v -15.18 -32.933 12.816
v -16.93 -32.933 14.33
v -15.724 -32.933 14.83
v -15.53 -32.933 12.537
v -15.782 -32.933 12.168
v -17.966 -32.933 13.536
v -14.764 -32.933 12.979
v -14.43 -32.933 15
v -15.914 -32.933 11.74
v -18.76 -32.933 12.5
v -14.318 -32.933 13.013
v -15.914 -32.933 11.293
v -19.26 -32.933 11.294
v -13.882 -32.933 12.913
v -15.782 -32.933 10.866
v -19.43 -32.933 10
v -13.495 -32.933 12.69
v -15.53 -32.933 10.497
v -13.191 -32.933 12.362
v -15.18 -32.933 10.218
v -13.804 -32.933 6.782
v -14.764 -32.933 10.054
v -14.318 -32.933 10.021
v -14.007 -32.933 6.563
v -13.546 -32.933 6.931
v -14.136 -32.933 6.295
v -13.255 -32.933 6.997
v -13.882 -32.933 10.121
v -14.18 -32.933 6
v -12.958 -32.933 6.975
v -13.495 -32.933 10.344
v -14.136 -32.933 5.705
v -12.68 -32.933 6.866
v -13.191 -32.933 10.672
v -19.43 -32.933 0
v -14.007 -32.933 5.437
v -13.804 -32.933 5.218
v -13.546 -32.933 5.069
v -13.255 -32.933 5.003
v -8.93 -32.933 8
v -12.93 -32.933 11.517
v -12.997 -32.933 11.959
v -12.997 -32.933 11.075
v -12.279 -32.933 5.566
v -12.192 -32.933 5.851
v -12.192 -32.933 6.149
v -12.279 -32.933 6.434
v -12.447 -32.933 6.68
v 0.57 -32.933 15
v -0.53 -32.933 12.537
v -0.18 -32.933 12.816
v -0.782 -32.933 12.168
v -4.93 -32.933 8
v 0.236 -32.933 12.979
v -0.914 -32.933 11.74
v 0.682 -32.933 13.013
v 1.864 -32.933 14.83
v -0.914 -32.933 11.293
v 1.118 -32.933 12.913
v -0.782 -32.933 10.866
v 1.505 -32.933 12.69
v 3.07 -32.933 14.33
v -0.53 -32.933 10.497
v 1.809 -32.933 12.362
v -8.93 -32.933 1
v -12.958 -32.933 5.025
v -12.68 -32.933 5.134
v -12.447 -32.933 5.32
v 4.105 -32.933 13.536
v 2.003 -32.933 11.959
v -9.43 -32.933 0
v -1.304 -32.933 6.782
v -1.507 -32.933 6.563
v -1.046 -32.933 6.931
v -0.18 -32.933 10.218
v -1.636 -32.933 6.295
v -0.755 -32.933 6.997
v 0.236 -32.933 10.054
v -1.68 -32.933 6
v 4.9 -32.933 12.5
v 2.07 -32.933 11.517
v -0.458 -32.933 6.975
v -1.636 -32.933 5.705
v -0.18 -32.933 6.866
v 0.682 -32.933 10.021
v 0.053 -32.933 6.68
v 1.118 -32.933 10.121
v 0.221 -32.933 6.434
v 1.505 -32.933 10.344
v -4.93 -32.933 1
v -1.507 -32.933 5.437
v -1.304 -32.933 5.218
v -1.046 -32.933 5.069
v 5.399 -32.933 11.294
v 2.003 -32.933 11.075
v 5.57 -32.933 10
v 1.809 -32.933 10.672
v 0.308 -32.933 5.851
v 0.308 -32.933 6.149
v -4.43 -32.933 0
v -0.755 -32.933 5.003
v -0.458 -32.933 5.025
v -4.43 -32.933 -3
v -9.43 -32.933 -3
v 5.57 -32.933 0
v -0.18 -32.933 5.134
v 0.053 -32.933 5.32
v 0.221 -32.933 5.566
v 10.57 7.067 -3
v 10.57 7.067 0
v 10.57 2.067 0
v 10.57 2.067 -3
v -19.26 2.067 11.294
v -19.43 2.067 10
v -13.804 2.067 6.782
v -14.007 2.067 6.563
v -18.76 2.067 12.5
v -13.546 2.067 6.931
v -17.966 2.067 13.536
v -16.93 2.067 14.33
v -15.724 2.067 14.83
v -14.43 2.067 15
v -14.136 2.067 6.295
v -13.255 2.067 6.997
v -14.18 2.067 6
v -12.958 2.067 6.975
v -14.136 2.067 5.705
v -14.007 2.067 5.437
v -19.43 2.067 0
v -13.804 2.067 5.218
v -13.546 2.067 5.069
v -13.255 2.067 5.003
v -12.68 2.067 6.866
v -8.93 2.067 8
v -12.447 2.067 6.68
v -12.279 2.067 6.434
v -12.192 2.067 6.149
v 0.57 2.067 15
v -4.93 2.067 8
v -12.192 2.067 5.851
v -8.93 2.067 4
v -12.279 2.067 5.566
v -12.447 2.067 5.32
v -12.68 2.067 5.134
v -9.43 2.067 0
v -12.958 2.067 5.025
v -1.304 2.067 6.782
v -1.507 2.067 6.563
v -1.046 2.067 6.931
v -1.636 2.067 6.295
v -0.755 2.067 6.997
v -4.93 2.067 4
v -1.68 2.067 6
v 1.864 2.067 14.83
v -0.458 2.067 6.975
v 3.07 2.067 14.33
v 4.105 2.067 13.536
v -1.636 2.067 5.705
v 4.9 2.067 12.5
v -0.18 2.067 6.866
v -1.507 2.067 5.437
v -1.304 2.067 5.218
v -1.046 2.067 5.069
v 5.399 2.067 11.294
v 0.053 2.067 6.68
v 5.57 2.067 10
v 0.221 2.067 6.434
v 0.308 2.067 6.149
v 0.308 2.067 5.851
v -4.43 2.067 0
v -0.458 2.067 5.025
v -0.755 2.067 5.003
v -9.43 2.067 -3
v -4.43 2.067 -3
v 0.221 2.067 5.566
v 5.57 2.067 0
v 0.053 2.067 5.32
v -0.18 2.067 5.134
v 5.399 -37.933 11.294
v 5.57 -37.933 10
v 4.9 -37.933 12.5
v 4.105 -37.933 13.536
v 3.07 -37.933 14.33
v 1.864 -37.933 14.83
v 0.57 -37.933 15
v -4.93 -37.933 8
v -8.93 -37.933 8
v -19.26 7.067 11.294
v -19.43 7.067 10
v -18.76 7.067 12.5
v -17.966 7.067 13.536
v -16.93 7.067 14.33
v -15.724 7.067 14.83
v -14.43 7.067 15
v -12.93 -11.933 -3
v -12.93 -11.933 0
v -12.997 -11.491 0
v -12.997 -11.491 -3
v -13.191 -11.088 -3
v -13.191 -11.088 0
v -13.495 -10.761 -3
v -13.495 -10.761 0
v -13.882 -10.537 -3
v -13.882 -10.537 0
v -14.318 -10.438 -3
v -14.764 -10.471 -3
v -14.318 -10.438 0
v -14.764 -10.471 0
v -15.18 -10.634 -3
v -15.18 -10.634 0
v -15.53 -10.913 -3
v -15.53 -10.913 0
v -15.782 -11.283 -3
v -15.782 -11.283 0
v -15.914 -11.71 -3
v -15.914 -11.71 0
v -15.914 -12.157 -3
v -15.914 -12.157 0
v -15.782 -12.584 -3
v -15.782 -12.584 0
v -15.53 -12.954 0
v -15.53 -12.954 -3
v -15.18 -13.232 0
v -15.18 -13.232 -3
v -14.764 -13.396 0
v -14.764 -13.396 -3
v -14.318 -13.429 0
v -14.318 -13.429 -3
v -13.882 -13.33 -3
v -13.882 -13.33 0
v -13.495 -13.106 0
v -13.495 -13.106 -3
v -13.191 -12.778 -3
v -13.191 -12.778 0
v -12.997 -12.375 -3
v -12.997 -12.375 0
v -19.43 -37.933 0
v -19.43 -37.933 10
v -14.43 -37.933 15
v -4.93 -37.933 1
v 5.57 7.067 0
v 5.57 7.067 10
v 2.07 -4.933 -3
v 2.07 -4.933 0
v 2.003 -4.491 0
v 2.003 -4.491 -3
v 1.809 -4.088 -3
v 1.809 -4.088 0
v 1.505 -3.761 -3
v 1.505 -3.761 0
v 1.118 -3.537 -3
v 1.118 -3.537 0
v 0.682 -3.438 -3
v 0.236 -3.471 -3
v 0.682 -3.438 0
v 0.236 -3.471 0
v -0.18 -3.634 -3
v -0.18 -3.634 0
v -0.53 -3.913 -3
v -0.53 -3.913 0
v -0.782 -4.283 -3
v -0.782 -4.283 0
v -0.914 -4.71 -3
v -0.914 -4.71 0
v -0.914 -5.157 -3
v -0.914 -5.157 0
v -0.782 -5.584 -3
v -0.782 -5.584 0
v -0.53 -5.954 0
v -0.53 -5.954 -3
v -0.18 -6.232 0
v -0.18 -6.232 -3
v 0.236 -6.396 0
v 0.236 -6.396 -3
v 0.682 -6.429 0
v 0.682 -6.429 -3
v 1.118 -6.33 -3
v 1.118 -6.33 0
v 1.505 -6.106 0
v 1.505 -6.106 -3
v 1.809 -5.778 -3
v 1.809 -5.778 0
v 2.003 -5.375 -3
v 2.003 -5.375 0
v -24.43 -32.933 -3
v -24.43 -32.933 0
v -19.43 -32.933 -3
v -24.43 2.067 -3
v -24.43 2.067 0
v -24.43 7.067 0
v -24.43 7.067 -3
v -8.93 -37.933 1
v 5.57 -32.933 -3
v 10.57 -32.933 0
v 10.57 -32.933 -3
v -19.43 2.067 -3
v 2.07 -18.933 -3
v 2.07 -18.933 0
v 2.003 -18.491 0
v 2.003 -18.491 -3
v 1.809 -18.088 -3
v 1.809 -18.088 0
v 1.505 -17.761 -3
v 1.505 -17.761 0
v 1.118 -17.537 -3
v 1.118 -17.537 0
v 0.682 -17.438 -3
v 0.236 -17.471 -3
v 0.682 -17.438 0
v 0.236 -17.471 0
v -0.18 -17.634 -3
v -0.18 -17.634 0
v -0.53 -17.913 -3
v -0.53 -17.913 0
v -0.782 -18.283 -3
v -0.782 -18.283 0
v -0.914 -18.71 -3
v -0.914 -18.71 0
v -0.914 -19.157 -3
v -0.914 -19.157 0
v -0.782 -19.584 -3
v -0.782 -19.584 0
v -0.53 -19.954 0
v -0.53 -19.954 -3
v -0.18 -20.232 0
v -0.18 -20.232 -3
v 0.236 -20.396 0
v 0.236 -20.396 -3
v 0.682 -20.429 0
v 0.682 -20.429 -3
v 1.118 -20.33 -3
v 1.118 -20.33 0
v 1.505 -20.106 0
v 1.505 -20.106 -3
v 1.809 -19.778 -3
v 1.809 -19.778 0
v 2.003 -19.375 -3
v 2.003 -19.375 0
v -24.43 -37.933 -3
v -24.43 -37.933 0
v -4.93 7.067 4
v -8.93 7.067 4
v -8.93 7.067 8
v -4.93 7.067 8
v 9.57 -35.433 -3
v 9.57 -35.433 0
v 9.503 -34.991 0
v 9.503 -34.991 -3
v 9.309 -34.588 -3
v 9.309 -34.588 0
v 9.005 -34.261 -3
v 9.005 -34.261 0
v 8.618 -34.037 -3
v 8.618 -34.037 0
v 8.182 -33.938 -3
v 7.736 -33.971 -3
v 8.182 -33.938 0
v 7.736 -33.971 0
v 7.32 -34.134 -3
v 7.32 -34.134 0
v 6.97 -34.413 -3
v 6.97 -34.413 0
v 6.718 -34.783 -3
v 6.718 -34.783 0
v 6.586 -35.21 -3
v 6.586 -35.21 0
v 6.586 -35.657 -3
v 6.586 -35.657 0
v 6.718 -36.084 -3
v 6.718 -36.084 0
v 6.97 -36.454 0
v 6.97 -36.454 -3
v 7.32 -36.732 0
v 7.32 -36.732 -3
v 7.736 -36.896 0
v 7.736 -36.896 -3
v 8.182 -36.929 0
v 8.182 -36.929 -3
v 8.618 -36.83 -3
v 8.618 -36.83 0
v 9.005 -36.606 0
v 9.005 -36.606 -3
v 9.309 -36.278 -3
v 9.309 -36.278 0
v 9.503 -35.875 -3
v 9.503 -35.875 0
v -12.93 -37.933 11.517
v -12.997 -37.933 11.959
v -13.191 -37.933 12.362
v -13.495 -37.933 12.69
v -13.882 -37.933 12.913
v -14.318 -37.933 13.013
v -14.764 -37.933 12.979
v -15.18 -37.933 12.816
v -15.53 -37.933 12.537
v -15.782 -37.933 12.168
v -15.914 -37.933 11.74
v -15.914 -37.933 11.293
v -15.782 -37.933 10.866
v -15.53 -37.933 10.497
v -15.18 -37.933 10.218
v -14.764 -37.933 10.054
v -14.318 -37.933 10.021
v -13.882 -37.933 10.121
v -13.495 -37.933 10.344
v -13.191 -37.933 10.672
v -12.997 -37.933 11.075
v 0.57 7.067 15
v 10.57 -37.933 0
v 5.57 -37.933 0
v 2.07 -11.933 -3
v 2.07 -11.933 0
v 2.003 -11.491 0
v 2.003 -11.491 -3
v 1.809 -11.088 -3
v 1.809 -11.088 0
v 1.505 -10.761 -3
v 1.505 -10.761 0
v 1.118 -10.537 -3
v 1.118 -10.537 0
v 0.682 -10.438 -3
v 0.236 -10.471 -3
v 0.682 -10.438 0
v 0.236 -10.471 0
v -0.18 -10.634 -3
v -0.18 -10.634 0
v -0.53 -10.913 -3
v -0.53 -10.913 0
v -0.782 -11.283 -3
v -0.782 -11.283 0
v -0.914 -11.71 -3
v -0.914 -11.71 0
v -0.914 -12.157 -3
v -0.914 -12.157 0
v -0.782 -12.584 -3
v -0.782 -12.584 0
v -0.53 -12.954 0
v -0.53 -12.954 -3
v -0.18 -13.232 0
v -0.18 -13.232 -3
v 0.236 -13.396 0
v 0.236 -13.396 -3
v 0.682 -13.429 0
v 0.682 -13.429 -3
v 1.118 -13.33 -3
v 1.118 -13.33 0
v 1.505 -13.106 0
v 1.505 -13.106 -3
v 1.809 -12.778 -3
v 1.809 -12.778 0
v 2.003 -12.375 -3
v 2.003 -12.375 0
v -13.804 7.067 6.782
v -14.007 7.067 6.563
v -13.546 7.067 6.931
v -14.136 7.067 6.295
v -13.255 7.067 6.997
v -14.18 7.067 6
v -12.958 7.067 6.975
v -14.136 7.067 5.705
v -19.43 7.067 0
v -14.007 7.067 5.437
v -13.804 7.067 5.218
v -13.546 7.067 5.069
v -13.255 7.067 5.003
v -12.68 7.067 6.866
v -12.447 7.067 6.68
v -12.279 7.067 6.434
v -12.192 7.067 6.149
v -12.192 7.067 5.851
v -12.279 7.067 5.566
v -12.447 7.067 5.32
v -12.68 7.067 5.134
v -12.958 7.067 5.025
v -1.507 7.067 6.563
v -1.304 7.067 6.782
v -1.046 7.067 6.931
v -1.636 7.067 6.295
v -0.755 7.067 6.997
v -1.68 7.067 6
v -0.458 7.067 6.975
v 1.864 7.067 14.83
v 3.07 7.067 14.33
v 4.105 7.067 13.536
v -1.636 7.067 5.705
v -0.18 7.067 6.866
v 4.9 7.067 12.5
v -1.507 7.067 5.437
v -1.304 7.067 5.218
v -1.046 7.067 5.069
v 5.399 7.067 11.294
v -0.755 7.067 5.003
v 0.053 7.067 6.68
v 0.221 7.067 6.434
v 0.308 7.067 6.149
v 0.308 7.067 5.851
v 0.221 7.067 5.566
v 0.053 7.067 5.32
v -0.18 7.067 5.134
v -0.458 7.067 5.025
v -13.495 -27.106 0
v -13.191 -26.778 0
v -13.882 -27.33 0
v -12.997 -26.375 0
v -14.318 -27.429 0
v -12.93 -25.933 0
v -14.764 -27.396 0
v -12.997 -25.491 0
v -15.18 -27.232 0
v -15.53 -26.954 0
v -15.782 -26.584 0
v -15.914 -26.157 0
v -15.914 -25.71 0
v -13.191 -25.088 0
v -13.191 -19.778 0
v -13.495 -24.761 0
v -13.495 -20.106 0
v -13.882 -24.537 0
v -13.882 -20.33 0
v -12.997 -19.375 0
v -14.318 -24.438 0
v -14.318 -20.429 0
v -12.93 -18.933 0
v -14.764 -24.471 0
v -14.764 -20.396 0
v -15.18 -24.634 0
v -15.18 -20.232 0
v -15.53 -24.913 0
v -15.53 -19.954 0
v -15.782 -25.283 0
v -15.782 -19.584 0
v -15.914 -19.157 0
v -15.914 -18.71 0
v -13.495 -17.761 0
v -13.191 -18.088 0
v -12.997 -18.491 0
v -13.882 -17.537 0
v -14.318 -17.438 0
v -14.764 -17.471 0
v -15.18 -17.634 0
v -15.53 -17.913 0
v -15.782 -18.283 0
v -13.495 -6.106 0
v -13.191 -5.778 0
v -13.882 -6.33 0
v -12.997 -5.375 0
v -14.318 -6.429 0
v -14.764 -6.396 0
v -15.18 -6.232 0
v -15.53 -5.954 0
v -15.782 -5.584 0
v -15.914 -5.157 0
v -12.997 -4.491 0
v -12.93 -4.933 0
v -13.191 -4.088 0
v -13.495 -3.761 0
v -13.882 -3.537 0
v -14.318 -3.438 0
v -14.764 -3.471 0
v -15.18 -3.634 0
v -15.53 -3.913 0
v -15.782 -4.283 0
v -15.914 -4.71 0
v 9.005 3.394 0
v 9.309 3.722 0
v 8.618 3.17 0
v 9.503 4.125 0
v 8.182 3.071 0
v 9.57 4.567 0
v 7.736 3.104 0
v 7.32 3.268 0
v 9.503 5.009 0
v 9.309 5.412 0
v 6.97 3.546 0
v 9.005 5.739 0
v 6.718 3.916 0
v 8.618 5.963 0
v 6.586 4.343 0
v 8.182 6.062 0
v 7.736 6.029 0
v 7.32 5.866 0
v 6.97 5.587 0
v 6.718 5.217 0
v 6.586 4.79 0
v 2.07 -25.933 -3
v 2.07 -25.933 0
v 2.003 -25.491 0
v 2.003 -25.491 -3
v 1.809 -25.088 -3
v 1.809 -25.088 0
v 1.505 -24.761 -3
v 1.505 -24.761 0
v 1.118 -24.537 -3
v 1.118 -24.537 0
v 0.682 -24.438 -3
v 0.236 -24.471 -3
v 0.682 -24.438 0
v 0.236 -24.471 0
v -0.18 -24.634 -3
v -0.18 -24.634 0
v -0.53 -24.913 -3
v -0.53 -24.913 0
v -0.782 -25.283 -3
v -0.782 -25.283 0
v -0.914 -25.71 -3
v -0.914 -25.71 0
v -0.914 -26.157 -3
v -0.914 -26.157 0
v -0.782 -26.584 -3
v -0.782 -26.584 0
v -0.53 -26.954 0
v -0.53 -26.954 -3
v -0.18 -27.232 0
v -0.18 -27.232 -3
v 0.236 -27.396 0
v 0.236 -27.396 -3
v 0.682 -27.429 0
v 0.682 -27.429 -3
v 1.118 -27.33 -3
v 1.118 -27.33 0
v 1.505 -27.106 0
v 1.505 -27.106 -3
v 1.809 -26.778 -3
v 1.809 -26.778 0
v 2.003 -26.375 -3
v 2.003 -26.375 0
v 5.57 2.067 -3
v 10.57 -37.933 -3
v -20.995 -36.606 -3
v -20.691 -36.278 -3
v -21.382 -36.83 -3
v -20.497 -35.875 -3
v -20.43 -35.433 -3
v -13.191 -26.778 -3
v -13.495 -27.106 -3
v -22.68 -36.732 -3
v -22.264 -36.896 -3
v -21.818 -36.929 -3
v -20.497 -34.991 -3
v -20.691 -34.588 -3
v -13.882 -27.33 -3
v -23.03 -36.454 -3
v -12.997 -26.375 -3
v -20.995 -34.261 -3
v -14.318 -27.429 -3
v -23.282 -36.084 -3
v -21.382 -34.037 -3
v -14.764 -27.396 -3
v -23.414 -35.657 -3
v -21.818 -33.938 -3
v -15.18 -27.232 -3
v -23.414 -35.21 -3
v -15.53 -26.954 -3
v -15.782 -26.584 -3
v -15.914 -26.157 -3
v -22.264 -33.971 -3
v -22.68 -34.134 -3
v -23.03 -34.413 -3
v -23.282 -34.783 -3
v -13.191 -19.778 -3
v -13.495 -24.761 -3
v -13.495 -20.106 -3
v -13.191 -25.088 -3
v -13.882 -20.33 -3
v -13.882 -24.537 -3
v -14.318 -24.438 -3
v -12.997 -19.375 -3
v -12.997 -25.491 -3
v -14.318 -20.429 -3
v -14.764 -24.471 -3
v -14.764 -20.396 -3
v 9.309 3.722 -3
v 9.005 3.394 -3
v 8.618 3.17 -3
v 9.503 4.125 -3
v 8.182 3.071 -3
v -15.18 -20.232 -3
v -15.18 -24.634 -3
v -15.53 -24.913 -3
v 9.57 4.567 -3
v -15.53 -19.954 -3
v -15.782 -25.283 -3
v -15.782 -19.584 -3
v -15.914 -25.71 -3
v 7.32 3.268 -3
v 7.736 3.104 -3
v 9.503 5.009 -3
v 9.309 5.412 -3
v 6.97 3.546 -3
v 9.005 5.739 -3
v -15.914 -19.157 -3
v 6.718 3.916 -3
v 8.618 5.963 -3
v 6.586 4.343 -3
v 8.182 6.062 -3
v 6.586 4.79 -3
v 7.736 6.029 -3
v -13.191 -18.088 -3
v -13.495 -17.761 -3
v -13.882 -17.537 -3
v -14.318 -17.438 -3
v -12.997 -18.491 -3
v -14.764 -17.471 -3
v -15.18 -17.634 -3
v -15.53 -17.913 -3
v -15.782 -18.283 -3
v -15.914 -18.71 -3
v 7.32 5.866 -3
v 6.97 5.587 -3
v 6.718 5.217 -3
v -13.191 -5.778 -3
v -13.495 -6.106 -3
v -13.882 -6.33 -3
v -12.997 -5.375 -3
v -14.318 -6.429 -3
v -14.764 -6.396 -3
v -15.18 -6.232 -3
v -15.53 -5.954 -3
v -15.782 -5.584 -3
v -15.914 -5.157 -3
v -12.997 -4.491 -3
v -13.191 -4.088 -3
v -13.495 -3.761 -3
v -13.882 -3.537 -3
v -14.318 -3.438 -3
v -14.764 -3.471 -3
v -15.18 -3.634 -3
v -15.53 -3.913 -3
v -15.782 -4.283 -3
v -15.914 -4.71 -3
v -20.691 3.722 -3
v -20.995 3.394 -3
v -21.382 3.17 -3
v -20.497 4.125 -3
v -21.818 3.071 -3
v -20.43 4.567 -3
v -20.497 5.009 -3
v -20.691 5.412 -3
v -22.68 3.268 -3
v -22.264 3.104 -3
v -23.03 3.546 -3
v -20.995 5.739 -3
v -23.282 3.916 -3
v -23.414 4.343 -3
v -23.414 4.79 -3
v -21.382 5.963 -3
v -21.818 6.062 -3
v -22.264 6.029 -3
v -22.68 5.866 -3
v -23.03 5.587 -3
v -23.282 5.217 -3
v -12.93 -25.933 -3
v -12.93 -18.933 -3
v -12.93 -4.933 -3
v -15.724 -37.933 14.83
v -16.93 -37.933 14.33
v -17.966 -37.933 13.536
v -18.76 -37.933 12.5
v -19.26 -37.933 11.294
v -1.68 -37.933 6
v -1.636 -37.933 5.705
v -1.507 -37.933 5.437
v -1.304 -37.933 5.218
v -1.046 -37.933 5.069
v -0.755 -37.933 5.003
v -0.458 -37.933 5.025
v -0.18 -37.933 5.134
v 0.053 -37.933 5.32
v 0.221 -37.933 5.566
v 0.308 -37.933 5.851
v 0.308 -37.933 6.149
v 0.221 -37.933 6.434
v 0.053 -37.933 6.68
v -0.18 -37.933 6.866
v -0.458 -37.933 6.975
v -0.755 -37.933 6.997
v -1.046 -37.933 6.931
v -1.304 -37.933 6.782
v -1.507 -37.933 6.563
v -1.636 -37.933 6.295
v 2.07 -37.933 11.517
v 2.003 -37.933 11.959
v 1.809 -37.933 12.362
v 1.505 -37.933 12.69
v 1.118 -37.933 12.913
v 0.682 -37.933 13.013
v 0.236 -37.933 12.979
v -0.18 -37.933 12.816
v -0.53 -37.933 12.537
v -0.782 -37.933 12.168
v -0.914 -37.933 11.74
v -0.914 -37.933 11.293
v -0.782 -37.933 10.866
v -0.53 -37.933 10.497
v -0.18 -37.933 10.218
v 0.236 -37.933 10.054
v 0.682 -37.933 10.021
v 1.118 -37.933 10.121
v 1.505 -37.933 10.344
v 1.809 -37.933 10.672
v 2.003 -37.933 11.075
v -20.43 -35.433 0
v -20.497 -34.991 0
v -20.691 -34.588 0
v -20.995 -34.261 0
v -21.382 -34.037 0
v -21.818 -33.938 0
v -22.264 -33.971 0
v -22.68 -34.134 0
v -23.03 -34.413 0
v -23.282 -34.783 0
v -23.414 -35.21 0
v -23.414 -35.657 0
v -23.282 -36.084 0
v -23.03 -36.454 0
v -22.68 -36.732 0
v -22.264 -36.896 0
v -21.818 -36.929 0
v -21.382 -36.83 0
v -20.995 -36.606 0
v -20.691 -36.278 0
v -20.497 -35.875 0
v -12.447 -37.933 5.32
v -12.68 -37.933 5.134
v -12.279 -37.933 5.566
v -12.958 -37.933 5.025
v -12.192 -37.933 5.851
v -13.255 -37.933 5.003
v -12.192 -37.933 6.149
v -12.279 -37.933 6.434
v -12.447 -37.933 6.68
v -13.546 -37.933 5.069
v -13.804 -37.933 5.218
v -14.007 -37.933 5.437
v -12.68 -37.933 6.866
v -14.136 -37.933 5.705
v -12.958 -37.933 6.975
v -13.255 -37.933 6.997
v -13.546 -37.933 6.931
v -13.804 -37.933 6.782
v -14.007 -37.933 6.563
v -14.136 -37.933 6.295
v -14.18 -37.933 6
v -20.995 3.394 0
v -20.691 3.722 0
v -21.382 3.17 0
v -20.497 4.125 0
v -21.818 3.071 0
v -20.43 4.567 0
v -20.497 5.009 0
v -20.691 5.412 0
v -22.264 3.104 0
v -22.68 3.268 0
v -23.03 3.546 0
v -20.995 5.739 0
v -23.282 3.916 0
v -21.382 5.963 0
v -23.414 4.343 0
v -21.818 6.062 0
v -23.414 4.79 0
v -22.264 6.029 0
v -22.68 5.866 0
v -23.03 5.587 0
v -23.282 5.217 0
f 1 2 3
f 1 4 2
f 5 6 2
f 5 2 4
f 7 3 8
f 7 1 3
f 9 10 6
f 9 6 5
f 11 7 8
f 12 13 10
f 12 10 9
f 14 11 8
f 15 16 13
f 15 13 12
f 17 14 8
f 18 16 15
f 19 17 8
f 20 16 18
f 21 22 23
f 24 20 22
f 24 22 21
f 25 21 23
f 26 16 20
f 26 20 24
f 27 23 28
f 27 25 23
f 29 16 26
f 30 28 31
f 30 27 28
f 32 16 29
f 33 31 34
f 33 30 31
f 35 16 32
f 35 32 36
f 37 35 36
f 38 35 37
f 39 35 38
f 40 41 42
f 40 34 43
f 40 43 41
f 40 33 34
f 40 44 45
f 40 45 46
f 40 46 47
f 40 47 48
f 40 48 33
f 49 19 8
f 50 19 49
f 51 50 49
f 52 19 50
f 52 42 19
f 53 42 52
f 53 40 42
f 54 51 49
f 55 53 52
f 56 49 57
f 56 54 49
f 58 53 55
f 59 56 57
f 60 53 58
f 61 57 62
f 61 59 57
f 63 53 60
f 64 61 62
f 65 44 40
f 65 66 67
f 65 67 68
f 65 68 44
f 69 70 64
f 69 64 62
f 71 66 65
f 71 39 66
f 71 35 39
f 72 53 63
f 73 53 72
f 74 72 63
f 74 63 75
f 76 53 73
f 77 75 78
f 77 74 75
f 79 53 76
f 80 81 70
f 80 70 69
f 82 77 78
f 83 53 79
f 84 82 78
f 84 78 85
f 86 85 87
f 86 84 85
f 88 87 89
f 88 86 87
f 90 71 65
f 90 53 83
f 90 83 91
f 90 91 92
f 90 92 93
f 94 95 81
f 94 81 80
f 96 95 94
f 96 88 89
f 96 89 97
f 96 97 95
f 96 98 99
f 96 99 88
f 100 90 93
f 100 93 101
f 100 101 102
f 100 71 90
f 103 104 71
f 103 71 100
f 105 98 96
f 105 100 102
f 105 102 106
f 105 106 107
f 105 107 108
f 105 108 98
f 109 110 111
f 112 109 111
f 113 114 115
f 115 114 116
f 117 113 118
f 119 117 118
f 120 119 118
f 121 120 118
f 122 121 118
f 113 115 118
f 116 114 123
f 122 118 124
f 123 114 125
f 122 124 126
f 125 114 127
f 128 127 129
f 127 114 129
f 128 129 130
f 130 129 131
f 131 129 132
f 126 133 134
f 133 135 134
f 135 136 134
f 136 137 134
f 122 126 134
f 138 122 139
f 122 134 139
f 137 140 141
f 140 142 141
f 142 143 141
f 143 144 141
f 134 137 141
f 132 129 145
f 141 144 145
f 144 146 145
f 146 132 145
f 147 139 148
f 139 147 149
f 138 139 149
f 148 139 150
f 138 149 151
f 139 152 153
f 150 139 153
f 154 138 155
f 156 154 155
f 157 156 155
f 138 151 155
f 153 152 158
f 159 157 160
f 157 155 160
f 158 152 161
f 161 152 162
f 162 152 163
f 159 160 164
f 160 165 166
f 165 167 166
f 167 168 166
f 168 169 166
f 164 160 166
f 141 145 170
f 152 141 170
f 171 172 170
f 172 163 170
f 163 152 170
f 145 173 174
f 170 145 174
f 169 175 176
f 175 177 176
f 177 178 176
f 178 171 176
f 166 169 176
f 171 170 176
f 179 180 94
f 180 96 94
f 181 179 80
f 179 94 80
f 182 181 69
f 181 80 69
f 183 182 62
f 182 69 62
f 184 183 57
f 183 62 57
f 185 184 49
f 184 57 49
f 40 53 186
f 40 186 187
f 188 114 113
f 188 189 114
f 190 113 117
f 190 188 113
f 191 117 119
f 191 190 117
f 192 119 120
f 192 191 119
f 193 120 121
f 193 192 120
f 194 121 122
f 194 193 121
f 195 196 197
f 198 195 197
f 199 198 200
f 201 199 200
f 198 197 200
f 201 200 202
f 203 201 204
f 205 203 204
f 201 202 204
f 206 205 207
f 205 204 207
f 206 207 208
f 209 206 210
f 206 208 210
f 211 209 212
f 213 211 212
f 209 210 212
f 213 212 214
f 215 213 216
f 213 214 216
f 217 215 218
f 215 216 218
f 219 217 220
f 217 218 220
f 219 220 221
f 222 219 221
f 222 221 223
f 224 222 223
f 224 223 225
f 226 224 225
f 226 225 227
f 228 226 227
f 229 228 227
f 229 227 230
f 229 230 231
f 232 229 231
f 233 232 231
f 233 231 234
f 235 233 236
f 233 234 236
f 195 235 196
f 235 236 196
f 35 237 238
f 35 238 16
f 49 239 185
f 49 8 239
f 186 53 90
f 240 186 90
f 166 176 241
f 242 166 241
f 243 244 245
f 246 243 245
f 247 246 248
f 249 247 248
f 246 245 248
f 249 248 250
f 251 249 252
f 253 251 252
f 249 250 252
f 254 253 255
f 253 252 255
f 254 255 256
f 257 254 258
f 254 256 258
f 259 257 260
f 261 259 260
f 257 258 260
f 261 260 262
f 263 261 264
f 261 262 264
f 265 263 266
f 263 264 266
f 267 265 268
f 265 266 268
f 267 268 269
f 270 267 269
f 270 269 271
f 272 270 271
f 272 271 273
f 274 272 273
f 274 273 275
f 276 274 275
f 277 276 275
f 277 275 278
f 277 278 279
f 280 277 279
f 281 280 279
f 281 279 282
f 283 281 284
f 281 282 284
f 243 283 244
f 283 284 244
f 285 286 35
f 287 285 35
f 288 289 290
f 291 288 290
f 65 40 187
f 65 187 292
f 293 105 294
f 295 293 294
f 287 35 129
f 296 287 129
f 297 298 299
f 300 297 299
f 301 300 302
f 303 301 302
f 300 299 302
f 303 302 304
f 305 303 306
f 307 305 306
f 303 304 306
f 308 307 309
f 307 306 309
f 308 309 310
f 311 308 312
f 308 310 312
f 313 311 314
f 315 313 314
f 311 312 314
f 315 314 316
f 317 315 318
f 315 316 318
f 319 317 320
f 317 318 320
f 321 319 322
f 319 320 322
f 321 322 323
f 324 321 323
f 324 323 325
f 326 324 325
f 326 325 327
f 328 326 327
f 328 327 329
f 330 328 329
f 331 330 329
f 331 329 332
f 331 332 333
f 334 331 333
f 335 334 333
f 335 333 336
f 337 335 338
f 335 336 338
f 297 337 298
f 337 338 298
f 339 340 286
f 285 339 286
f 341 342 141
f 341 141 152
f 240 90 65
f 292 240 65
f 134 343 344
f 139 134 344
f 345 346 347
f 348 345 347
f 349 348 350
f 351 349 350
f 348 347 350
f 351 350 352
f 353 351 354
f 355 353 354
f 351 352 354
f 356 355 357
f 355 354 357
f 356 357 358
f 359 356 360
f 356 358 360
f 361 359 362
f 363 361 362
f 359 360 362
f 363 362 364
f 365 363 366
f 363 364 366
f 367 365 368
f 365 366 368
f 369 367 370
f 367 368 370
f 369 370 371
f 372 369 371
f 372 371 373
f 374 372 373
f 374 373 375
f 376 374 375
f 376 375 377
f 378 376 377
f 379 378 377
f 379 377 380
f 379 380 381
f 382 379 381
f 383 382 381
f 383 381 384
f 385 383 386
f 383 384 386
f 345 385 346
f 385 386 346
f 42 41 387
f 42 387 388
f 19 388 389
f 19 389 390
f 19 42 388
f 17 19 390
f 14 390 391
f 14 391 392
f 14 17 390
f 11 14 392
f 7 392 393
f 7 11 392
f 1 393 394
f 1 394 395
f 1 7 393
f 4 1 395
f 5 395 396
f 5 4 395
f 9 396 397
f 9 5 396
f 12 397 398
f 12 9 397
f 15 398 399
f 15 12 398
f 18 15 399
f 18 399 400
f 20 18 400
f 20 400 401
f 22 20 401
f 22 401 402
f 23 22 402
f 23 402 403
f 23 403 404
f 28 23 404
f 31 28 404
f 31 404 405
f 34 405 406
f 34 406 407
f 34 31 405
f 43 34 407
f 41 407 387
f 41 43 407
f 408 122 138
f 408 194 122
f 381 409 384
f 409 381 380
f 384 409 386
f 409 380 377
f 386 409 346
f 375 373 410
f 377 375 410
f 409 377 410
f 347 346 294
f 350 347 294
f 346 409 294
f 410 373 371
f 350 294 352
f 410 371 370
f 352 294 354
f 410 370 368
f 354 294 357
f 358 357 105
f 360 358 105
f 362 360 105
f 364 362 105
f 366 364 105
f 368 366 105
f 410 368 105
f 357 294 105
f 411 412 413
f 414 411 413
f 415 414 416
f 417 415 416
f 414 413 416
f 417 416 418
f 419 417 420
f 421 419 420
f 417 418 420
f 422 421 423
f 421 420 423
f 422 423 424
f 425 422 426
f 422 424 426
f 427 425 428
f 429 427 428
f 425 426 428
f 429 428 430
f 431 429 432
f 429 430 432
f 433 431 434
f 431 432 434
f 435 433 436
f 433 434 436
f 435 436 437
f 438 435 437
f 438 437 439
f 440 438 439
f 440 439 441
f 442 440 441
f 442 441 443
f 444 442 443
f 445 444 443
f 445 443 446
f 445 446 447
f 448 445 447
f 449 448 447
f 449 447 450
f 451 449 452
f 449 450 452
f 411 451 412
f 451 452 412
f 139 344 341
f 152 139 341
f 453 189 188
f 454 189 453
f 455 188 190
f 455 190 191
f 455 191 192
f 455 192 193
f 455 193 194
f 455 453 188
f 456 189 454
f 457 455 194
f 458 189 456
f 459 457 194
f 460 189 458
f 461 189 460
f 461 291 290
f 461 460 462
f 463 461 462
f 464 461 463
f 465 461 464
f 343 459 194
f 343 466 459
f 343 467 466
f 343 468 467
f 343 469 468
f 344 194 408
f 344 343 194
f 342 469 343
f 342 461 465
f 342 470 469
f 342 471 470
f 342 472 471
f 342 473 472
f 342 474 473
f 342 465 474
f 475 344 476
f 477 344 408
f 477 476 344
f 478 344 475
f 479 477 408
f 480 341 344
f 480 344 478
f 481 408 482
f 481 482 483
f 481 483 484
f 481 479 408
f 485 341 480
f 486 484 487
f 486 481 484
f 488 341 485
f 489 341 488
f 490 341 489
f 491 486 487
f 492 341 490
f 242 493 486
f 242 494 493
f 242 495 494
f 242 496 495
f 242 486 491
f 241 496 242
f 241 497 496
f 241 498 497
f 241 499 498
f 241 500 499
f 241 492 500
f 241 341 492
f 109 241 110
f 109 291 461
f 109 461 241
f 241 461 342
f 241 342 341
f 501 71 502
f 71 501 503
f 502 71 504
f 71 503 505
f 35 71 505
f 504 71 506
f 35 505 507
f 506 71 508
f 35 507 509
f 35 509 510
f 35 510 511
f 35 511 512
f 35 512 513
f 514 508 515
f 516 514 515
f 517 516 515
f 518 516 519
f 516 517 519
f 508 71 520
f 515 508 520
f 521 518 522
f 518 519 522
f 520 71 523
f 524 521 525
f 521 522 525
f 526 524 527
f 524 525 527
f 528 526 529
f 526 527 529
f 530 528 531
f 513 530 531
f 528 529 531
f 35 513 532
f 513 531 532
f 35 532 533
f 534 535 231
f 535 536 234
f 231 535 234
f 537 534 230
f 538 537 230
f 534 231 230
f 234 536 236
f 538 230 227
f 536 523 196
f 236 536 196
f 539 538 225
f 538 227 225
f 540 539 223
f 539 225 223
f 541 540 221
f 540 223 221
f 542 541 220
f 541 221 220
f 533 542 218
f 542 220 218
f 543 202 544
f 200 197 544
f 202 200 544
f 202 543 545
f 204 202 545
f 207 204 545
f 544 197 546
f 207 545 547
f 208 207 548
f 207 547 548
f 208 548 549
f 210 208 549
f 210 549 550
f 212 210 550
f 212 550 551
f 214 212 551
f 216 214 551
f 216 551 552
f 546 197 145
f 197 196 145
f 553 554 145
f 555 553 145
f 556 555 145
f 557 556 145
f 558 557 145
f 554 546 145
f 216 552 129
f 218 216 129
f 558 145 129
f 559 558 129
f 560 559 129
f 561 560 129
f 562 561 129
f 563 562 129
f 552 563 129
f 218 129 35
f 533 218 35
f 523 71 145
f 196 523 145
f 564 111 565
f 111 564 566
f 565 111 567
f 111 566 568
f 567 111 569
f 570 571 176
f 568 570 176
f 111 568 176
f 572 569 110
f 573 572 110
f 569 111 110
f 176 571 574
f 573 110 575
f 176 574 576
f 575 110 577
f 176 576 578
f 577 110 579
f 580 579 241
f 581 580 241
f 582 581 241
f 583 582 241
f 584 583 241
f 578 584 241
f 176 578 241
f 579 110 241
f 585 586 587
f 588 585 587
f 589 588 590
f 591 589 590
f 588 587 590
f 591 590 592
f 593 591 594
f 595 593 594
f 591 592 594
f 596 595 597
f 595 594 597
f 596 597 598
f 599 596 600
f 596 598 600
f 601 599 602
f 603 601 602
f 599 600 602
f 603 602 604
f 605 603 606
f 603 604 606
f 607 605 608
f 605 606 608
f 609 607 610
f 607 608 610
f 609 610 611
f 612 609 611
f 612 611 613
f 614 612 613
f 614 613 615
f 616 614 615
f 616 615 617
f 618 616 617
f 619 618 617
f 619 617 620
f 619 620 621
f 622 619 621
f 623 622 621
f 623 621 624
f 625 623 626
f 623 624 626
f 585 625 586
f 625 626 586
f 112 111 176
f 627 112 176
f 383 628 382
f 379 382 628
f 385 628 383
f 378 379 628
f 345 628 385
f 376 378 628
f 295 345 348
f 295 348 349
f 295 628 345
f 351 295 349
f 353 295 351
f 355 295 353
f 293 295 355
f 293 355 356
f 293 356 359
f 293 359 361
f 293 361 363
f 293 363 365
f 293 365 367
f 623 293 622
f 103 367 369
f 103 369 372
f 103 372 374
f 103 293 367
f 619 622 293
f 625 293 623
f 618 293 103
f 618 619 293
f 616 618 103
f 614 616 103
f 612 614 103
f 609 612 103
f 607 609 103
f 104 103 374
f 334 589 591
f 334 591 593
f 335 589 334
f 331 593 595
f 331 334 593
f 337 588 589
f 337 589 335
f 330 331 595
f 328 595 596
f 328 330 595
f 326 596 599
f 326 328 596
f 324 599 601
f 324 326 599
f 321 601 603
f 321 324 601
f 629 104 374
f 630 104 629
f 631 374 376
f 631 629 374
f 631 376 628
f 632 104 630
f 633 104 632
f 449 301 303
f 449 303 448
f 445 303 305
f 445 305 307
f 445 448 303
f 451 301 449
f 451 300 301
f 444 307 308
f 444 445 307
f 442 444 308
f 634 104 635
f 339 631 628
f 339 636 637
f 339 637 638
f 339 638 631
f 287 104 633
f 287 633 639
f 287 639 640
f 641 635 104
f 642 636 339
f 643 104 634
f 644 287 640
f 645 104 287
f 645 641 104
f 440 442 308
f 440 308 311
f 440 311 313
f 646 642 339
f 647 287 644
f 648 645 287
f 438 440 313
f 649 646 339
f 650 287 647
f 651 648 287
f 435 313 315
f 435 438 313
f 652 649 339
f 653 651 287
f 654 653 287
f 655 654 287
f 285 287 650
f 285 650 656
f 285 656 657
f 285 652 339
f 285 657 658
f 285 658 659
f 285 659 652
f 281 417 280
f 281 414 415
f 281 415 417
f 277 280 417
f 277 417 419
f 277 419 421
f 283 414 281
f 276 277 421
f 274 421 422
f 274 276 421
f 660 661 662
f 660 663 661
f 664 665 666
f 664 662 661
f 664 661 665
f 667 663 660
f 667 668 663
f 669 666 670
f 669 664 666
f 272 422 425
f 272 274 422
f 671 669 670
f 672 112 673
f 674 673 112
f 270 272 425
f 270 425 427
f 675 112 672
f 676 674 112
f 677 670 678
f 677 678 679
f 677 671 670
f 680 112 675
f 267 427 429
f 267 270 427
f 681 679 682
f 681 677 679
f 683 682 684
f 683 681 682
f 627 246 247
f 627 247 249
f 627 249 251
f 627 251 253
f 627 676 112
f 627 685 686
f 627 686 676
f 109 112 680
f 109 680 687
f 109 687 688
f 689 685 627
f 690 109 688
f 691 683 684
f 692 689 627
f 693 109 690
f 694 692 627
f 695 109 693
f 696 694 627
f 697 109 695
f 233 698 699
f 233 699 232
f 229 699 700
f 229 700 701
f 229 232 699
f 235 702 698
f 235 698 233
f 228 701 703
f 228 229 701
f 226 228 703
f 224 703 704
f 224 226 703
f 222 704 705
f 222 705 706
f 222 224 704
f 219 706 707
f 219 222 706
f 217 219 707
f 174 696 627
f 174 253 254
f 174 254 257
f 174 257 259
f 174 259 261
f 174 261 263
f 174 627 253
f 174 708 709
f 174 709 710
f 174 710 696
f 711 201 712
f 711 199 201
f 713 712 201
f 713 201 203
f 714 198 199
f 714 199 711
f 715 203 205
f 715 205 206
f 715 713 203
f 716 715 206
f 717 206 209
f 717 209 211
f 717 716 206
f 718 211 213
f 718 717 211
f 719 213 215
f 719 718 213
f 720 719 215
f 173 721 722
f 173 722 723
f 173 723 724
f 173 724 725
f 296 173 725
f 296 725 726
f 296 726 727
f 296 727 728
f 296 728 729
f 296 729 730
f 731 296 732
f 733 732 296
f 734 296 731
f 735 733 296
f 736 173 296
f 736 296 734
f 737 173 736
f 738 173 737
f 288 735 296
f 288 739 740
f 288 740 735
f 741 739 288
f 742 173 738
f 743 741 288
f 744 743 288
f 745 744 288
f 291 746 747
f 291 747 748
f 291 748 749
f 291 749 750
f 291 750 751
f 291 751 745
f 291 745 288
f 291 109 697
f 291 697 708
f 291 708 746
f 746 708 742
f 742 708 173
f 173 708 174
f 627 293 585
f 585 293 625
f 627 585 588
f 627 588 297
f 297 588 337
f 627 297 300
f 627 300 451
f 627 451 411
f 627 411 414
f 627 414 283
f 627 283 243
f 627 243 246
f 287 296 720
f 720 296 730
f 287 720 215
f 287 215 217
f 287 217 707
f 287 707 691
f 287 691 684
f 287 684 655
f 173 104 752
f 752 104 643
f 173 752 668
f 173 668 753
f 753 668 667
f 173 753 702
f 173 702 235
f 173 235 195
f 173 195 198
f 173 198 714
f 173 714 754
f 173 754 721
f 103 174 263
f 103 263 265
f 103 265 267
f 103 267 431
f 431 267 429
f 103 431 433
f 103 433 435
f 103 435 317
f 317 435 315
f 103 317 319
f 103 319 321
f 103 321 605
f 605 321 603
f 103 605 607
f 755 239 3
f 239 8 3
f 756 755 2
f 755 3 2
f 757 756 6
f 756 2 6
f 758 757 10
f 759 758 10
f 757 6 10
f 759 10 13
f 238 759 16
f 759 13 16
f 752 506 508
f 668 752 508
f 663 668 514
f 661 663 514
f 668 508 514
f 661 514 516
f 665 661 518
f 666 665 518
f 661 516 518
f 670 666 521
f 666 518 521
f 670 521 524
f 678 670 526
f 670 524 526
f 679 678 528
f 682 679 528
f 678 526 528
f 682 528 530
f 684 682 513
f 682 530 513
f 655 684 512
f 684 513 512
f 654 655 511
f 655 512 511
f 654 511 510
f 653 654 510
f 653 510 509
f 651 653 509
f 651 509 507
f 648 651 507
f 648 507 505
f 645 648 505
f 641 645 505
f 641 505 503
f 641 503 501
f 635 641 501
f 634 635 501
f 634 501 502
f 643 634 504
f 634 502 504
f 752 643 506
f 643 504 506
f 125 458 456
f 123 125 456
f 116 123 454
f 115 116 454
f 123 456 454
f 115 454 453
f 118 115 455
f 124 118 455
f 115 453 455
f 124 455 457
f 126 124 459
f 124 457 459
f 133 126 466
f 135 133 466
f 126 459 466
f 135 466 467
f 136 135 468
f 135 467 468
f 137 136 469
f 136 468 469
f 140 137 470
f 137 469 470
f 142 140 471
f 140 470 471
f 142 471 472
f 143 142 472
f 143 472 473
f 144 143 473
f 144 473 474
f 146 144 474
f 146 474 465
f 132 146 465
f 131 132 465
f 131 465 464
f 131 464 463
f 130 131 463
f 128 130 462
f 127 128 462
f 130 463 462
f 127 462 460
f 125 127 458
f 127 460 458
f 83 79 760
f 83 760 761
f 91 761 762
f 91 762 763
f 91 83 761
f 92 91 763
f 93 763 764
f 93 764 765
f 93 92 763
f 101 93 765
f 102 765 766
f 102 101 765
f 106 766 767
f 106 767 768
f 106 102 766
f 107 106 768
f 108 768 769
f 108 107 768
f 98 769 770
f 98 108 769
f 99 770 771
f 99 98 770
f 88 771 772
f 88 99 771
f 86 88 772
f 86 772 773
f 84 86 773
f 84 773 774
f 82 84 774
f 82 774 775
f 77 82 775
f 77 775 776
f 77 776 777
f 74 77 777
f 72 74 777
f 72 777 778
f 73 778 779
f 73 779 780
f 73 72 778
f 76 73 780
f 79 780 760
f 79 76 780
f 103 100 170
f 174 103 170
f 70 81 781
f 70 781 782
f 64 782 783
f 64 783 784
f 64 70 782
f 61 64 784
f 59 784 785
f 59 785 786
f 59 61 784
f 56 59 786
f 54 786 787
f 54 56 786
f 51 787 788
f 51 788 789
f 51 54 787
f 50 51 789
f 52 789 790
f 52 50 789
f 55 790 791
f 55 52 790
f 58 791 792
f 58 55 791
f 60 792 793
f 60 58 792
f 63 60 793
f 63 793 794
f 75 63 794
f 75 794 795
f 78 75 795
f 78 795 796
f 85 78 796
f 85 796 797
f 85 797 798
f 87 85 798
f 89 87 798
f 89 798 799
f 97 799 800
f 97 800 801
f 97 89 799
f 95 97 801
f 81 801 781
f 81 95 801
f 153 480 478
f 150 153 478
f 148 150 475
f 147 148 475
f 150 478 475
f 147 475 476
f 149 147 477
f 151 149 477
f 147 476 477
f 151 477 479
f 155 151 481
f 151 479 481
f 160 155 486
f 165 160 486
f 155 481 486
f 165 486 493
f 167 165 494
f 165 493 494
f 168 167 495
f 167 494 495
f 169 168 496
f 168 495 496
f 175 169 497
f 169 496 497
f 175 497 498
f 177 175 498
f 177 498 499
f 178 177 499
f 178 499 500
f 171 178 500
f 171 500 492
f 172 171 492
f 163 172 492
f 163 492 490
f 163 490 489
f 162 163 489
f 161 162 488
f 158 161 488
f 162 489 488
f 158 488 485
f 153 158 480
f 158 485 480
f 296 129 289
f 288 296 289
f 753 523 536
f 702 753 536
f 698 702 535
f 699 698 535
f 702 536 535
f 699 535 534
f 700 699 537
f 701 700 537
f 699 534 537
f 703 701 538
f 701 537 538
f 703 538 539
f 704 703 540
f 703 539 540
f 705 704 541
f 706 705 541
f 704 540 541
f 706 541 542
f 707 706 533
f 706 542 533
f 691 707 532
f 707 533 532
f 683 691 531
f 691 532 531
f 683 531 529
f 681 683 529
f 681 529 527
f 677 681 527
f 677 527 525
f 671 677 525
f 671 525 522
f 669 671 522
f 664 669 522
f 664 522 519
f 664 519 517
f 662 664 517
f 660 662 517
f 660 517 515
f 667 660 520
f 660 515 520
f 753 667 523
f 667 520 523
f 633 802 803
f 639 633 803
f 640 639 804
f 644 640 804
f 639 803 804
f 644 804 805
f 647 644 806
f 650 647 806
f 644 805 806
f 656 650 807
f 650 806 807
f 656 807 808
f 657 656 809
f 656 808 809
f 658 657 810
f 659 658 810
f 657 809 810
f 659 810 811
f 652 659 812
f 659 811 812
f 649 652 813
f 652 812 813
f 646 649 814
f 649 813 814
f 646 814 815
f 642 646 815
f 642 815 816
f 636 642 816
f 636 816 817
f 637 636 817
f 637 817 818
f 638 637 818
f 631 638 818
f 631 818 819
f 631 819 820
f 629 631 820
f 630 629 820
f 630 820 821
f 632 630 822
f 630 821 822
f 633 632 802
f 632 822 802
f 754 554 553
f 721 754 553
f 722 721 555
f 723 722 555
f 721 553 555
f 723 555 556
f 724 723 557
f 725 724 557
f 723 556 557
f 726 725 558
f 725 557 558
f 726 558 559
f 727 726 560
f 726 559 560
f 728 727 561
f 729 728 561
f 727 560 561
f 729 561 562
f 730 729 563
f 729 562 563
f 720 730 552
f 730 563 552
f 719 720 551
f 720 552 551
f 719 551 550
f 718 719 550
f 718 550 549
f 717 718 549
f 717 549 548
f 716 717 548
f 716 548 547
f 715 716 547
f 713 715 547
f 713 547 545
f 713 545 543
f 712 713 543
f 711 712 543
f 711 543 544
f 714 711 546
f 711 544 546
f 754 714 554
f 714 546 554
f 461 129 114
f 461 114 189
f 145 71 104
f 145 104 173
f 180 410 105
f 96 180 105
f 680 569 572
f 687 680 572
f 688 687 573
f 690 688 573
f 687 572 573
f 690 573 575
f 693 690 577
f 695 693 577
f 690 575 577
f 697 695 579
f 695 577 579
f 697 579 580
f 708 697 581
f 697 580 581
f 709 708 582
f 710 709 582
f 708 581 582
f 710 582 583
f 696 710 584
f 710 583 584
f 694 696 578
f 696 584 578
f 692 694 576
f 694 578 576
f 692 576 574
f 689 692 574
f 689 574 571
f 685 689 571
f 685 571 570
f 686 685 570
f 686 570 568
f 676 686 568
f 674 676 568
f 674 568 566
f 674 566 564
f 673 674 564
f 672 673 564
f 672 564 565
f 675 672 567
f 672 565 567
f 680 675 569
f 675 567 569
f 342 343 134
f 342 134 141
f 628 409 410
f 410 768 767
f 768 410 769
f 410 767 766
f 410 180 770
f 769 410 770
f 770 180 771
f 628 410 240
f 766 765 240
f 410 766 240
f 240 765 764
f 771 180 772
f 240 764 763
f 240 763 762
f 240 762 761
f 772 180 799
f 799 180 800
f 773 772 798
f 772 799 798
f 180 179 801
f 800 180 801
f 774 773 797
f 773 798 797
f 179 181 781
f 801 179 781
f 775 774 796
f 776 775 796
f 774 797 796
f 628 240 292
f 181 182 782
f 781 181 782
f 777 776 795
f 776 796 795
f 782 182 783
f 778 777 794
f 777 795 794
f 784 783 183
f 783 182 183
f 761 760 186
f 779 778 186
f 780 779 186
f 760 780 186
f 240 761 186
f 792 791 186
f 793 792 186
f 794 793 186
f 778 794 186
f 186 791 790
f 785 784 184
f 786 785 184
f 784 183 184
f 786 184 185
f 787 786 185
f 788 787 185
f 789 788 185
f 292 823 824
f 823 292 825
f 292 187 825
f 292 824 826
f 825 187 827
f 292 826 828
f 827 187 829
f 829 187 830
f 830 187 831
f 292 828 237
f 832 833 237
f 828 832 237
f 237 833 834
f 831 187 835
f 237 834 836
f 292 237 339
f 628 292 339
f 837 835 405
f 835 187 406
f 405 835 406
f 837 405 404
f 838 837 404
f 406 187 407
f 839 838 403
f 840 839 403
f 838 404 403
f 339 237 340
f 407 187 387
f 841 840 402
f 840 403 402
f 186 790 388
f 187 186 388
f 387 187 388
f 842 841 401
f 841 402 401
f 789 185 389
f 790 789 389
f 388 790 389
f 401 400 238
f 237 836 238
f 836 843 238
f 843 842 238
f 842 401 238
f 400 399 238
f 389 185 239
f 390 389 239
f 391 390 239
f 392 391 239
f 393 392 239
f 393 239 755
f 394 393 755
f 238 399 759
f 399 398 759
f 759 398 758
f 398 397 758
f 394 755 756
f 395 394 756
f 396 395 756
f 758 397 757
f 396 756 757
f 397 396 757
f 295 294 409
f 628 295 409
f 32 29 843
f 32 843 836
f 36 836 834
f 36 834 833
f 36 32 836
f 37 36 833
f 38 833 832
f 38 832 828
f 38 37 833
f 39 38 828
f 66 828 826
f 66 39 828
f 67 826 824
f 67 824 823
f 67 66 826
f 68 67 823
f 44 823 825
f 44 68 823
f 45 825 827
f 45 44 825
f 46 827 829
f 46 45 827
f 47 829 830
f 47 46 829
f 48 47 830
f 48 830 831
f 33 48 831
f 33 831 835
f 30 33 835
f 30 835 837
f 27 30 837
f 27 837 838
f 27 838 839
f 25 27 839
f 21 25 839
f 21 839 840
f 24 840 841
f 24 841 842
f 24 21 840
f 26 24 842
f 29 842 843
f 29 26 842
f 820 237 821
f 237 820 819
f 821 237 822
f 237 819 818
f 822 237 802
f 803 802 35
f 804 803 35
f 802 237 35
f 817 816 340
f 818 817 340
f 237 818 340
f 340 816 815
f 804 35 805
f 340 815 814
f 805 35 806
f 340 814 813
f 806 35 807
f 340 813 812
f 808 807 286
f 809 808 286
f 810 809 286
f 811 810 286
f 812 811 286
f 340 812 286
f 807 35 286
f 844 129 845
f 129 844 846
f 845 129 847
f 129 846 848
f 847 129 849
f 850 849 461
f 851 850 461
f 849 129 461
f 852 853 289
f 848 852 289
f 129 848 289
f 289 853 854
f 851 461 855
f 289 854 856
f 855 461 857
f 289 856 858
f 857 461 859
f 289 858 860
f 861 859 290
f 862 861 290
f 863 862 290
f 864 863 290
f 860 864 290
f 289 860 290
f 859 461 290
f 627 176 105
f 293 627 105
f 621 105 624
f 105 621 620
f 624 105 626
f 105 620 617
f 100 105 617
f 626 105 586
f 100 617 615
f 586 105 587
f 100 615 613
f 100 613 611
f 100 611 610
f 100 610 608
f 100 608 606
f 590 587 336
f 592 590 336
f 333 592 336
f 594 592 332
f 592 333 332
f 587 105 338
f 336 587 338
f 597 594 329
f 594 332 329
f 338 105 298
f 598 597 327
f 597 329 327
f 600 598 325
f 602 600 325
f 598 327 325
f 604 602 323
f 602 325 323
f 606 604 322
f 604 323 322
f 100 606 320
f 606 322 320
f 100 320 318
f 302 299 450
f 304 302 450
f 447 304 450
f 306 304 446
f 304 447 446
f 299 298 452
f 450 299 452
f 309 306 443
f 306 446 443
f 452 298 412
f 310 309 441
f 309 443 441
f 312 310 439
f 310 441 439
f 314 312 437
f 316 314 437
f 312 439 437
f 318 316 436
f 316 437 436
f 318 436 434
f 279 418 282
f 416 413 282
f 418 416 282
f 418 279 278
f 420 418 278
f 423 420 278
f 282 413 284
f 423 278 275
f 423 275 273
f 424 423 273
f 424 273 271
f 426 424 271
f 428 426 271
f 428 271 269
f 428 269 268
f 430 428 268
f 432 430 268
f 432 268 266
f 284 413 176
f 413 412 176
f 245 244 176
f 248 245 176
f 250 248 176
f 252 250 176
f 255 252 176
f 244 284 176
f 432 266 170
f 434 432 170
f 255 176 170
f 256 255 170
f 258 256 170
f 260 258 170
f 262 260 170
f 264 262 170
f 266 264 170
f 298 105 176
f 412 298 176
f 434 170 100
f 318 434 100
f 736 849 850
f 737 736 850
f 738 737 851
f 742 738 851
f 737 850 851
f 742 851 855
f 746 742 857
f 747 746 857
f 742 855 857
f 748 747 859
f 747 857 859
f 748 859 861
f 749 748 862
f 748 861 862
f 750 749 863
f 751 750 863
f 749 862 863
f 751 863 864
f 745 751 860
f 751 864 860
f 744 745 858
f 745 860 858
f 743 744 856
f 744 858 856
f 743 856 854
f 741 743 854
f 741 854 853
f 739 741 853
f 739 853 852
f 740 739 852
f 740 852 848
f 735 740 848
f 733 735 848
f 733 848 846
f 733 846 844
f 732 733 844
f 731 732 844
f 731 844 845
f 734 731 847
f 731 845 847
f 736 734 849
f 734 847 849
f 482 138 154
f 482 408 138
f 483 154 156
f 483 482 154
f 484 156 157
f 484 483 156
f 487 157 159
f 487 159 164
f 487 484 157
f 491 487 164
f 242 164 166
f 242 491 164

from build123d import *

# Parameters (mm, degrees)
ESBO_O1_R                = 1.5
ESBO_O1_W                = 5
ESBO_O1_H                = 35
RESSALTO_EXTRUS_O1_DEPTH = 3
ESBO_O2_W                = 25
ESBO_O2_H                = 5
RESSALTO_EXTRUS_O2_DEPTH = 15
FILETE5_R                = 5
FILETE6_R                = 5
FILETE7_R                = 5
FILETE8_R                = 5
ESBO_O4_R                = 1
ESBO_O4_W                = 4
ESBO_O4_H                = 4
CORTE_EXTRUS_O2_DEPTH    = 5
CORTE_EXTRUS_O3_START    = -5
ESBO_O3_R                = 1
ESBO_O3_R_2              = 1.5
ESBO_O3_W                = 4
ESBO_O3_H                = 7
CORTE_EXTRUS_O3_DEPTH    = 5


with BuildPart() as part:
    # Esboço1 → Ressalto-extrusão1 (new body)
    with BuildSketch(Plane.XY):
        Polygon((-24.430369357, 7.066666667), (10.569630643, 7.066666667), (10.569630643, 2.066666667), (5.569630643, 2.066666667), (5.569630643, -32.933333333), (10.569630643, -32.933333333), (10.569630643, -37.933333333), (-24.430369357, -37.933333333), (-24.430369357, -32.933333333), (-19.430369357, -32.933333333), (-19.430369357, 2.066666667), (-24.430369357, 2.066666667), align=None)
        with Locations((-14.430369357, -4.933333333)):
            Circle(ESBO_O1_R, mode=Mode.SUBTRACT)
        with Locations((-14.430369357, -11.933333333)):
            Circle(ESBO_O1_R, mode=Mode.SUBTRACT)
        with Locations((-14.430369357, -18.933333333)):
            Circle(ESBO_O1_R, mode=Mode.SUBTRACT)
        with Locations((0.569630643, -4.933333333)):
            Circle(ESBO_O1_R, mode=Mode.SUBTRACT)
        with Locations((0.569630643, -18.933333333)):
            Circle(ESBO_O1_R, mode=Mode.SUBTRACT)
        with Locations((0.569630643, -25.933333333)):
            Circle(ESBO_O1_R, mode=Mode.SUBTRACT)
        with Locations((-14.430369357, -25.933333333)):
            Circle(ESBO_O1_R, mode=Mode.SUBTRACT)
        with Locations((0.569630643, -11.933333333)):
            Circle(ESBO_O1_R, mode=Mode.SUBTRACT)
        with Locations((-21.930369357, 4.566666667)):
            Circle(ESBO_O1_R, mode=Mode.SUBTRACT)
        with Locations((8.069630643, 4.566666667)):
            Circle(ESBO_O1_R, mode=Mode.SUBTRACT)
        with Locations((-21.930369357, -35.433333333)):
            Circle(ESBO_O1_R, mode=Mode.SUBTRACT)
        with Locations((8.069630643, -35.433333333)):
            Circle(ESBO_O1_R, mode=Mode.SUBTRACT)
        with Locations((-6.930369357, -15.433333333)):
            Rectangle(ESBO_O1_W, ESBO_O1_H, mode=Mode.SUBTRACT)
    extrude(amount=-RESSALTO_EXTRUS_O1_DEPTH)

    # Esboço2 → Ressalto-extrusão2 (add)
    with BuildSketch(Plane.XY):
        with Locations((-6.930369357, 4.566666667)):
            Rectangle(ESBO_O2_W, ESBO_O2_H)
        with Locations((-6.930369357, -35.433333333)):
            Rectangle(ESBO_O2_W, ESBO_O2_H)
    extrude(amount=RESSALTO_EXTRUS_O2_DEPTH)

    # Filete5
    filete5_edges = [part.edges().sort_by_distance(p)[0] for p in [
        (5.569630643, -35.433333333, 15),
    ]]
    fillet(filete5_edges, radius=FILETE5_R)

    # Filete6
    filete6_edges = [part.edges().sort_by_distance(p)[0] for p in [
        (-19.430369357, -35.433333333, 15),
    ]]
    fillet(filete6_edges, radius=FILETE6_R)

    # Filete7
    filete7_edges = [part.edges().sort_by_distance(p)[0] for p in [
        (-19.430369357, 4.566666667, 15),
    ]]
    fillet(filete7_edges, radius=FILETE7_R)

    # Filete8
    filete8_edges = [part.edges().sort_by_distance(p)[0] for p in [
        (5.569630643, 4.566666667, 15),
    ]]
    fillet(filete8_edges, radius=FILETE8_R)

    # Esboço4 → Corte-extrusão2 (cut)
    with BuildSketch(Plane(origin=(0, 7.066666667, 0), x_dir=(1, 0, 0), z_dir=(0, 1, 0))):
        with Locations(Location((-13.180369357, -6, 0), (0, 0, 180))):
            Circle(ESBO_O4_R)
        with Locations(Location((-0.680369357, -6, 0), (0, 0, 180))):
            Circle(ESBO_O4_R)
        with Locations((-6.930369357, -6)):
            Rectangle(ESBO_O4_W, ESBO_O4_H)
    extrude(amount=-CORTE_EXTRUS_O2_DEPTH, mode=Mode.SUBTRACT)

    # Esboço3 → Corte-extrusão3 (cut)
    with BuildSketch(Plane(origin=(0, -37.933333333, 0), x_dir=(-1, 0, 0), z_dir=(0, -1, 0)).offset(CORTE_EXTRUS_O3_START)):
        with Locations((13.180369357, -6)):
            Circle(ESBO_O3_R)
        with Locations(Location((0.680369357, -6.000000354, 0), (0, 0, 2.0294e-05))):
            Circle(ESBO_O3_R)
        with Locations(Location((14.430369357, -11.516860689, 0), (0, 0, 180))):
            Circle(ESBO_O3_R_2)
        with Locations(Location((-0.569630643, -11.516860689, 0), (0, 0, 180))):
            Circle(ESBO_O3_R_2)
        with Locations((6.930369357, -4.5)):
            Rectangle(ESBO_O3_W, ESBO_O3_H)
    extrude(amount=CORTE_EXTRUS_O3_DEPTH, mode=Mode.SUBTRACT)


solid = part.part
